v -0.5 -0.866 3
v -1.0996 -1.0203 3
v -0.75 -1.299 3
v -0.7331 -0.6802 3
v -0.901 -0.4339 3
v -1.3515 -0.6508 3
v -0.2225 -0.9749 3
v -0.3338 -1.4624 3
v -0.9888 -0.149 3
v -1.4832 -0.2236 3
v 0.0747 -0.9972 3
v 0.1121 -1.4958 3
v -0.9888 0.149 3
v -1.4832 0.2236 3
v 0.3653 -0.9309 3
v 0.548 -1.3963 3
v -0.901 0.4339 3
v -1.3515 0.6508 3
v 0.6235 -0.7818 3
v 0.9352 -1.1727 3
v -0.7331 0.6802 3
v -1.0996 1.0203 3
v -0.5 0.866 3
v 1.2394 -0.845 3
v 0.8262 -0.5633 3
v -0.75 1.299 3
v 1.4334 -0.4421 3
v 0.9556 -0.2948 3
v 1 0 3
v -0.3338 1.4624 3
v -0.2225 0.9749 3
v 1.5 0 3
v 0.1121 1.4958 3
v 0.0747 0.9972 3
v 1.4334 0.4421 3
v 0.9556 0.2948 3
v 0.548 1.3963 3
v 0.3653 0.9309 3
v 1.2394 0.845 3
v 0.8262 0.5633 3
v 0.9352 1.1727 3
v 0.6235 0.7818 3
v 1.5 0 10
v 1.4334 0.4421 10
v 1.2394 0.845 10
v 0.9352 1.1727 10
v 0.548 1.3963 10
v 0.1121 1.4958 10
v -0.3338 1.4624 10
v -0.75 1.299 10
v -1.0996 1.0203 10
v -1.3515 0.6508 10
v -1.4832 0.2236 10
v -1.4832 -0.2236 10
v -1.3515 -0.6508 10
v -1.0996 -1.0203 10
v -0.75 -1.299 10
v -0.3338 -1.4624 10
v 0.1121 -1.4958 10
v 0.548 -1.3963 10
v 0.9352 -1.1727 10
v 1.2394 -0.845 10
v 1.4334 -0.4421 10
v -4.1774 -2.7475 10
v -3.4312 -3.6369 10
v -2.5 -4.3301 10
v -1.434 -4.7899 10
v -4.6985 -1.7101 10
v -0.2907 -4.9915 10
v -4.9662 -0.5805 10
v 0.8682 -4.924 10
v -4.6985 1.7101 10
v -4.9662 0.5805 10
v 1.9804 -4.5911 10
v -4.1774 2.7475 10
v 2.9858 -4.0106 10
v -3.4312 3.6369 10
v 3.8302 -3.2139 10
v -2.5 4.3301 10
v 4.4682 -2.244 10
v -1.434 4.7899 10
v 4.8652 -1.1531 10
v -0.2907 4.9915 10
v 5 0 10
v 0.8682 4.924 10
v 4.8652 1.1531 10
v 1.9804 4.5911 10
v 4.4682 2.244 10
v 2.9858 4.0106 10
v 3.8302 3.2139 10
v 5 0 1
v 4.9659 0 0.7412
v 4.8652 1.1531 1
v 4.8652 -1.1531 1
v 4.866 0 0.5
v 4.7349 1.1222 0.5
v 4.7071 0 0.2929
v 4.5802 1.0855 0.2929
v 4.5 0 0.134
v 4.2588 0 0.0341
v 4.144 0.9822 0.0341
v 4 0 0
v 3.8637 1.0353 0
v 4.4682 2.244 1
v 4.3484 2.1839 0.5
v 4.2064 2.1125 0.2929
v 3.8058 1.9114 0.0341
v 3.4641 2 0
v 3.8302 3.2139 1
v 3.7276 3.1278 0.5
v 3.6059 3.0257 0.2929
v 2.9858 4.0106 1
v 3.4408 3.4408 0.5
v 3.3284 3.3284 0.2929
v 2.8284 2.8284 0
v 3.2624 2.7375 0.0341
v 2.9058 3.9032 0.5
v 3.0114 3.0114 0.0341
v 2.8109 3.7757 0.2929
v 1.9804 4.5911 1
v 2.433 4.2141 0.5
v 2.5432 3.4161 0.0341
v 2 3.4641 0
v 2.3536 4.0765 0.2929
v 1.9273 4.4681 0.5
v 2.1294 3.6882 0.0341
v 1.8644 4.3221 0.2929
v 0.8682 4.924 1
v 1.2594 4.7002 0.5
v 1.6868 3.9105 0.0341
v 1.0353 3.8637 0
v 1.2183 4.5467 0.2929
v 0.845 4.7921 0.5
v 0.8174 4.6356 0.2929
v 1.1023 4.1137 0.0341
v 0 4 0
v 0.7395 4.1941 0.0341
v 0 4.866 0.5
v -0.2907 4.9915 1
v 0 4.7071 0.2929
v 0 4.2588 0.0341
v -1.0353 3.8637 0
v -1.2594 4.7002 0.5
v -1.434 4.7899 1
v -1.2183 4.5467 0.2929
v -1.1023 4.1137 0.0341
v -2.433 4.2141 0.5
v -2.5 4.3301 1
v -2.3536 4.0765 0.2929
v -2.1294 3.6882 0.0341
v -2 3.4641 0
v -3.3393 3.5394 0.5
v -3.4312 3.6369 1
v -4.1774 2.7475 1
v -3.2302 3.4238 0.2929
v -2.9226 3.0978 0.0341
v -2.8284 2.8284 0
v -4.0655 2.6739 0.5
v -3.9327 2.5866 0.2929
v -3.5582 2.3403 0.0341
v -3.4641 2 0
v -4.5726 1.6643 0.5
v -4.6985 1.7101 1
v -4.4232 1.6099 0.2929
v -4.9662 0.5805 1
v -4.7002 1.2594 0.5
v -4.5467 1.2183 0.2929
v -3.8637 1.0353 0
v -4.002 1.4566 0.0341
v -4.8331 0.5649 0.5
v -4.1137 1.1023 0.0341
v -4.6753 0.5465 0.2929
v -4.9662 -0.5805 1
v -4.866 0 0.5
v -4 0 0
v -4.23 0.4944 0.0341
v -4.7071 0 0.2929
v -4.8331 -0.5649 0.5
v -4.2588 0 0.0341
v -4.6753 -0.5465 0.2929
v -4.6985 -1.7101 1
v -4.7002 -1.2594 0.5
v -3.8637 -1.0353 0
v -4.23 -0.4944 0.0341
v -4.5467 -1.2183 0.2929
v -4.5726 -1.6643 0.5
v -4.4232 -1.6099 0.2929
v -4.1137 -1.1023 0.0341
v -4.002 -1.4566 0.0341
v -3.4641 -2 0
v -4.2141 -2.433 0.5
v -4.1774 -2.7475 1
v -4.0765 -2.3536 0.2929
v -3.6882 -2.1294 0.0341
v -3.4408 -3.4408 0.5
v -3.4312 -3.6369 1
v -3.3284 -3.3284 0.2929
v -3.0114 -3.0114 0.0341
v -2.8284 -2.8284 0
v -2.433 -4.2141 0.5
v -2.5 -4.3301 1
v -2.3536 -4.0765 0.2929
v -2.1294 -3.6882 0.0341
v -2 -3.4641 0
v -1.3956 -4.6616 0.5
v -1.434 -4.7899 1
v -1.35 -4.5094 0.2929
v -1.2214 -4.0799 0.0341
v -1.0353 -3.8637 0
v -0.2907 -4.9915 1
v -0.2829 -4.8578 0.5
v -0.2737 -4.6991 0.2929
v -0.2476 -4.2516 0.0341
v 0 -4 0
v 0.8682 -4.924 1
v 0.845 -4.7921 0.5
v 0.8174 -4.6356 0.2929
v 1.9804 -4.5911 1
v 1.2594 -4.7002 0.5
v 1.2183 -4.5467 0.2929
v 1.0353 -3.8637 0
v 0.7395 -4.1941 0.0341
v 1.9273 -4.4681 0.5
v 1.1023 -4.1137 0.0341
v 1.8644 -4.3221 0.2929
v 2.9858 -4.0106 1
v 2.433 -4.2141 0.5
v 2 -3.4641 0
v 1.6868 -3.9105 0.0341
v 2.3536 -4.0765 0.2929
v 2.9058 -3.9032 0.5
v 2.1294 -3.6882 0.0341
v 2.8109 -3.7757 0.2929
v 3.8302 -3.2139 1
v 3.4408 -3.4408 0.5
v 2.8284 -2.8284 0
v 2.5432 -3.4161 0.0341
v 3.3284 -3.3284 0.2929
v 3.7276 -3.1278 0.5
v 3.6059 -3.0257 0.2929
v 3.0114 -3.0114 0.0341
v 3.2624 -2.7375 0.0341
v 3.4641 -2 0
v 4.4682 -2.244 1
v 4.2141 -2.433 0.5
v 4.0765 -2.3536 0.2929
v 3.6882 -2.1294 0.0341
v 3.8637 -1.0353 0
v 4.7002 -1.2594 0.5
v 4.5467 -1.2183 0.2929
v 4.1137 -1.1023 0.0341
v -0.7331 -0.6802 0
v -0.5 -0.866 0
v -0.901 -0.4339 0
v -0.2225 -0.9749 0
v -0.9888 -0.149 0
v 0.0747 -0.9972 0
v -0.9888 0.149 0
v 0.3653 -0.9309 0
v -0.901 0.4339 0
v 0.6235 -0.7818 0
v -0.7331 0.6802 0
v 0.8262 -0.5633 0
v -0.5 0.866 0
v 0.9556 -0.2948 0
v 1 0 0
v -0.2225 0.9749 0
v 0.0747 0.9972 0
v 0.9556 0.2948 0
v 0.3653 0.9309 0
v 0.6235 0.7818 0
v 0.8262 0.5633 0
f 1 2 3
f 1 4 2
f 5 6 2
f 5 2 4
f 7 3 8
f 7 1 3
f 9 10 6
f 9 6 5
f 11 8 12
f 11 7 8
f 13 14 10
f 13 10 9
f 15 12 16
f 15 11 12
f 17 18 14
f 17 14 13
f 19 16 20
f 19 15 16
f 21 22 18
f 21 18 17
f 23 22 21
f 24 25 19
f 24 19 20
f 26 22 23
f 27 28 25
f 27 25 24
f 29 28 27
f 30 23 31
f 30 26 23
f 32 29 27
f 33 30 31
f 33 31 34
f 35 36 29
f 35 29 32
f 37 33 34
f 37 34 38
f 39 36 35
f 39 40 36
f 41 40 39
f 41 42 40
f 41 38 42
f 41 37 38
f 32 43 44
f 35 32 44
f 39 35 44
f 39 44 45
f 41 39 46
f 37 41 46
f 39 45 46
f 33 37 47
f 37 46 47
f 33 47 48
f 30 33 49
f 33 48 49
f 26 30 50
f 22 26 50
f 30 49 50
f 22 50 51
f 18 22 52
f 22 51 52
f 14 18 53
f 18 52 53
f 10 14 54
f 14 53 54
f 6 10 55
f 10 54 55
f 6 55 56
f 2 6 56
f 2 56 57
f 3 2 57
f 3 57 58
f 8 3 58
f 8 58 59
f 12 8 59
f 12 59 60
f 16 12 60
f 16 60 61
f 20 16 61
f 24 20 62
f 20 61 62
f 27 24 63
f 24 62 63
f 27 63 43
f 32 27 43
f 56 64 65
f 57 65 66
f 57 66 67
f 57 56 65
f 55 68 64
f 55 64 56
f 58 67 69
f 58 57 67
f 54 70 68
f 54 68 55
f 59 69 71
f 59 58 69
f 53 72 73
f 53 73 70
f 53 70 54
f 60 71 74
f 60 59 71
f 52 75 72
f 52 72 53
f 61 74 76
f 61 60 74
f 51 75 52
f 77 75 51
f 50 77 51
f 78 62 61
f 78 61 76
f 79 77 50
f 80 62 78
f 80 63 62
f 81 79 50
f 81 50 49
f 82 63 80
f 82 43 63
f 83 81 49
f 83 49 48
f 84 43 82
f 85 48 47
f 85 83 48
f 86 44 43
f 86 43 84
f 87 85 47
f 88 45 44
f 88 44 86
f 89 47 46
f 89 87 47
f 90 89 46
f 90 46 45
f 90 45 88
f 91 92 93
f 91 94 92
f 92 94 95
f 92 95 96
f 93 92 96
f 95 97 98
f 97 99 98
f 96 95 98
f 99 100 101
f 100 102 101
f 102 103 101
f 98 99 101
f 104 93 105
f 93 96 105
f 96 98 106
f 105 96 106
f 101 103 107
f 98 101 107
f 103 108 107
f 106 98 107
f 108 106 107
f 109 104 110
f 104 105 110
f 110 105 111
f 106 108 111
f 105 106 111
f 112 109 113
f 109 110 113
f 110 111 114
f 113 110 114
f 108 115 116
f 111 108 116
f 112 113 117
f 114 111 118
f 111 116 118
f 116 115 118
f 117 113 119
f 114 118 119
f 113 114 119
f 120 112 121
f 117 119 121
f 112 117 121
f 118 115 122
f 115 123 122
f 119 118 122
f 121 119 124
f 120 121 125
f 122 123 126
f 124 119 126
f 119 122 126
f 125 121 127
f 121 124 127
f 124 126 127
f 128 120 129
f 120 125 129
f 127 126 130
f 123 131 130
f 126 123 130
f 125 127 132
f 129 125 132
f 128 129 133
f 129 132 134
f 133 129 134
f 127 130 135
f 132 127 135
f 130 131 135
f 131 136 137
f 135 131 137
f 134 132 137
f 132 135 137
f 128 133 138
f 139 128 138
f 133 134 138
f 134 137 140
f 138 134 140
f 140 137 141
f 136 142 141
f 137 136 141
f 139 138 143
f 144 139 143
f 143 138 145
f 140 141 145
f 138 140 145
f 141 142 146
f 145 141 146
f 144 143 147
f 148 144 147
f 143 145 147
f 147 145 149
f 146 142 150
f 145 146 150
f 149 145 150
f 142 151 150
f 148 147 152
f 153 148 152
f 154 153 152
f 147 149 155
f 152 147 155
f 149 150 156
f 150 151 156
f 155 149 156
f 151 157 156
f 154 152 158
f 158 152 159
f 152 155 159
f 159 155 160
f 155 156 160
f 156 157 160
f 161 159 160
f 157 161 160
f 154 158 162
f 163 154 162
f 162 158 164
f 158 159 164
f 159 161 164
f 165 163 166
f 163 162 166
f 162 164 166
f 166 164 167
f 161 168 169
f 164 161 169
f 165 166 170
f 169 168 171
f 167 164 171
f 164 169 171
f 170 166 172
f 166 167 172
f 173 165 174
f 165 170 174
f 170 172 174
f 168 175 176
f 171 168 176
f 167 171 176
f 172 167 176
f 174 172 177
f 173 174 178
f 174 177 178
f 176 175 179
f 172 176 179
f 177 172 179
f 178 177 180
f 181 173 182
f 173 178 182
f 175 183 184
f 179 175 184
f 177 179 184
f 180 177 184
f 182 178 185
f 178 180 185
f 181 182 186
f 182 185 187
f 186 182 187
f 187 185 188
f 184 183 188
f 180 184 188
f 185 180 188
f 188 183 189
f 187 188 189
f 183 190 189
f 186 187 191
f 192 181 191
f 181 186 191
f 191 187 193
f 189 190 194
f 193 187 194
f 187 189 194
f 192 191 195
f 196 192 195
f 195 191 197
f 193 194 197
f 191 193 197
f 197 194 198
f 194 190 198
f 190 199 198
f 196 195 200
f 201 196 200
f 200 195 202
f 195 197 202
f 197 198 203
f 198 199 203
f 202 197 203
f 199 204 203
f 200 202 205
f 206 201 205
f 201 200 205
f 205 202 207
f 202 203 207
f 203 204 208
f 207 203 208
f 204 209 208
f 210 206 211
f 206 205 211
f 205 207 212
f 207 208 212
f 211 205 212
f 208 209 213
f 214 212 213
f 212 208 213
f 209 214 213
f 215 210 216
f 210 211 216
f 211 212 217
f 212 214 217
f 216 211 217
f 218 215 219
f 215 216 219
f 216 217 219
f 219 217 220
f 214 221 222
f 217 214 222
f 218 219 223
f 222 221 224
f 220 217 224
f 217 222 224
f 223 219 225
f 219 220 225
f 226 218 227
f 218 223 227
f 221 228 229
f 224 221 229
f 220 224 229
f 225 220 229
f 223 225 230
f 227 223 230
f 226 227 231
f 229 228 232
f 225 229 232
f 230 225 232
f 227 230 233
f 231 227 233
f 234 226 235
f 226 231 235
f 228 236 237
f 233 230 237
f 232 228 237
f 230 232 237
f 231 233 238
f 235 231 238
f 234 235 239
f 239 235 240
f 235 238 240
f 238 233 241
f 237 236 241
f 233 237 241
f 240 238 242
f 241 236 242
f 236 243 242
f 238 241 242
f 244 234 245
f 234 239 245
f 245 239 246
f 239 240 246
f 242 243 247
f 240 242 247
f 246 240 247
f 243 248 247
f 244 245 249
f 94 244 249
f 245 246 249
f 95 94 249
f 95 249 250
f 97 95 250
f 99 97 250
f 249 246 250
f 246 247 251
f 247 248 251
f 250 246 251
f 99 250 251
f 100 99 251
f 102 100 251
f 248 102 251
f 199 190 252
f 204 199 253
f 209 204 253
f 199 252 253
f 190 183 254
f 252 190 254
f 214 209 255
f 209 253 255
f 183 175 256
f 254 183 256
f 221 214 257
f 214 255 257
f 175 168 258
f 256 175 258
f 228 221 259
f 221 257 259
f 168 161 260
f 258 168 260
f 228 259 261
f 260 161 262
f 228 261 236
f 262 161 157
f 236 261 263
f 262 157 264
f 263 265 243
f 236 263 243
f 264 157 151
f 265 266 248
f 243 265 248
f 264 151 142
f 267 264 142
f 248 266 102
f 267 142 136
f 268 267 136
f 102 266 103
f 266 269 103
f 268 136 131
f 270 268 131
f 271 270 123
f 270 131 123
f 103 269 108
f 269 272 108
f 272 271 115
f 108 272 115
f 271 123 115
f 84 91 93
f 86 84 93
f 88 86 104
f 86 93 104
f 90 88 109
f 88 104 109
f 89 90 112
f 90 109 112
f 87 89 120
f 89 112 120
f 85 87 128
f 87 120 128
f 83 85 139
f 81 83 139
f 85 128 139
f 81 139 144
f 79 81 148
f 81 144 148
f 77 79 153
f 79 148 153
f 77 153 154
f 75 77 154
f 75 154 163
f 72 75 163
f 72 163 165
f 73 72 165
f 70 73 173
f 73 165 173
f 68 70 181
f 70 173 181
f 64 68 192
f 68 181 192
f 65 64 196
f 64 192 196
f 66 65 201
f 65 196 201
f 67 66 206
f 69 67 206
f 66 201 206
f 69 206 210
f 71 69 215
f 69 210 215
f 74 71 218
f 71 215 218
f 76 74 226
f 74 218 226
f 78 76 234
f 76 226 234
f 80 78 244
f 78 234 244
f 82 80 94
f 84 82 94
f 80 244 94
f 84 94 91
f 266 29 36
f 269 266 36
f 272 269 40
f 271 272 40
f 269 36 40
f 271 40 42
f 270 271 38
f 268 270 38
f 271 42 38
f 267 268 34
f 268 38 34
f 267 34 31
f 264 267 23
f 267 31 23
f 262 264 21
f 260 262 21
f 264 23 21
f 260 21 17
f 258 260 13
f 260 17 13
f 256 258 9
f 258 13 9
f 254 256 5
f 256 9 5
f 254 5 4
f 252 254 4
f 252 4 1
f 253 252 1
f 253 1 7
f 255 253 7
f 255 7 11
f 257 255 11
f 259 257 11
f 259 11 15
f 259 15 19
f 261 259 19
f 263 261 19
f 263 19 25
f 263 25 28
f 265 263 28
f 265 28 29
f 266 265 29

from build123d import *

# Parameters (mm, degrees)
ESQUISSE1_R             = 5
BOSS_EXTRU_1_DEPTH      = 10
ESQUISSE2_R             = 1.5
ENL_V_MAT_EXTRU_1_DEPTH = 7
ESQUISSE3_R             = 1
ENL_V_MAT_EXTRU_2_DEPTH = 7
CONG_1_R                = 1


with BuildPart() as part:
    # Esquisse1 → Boss.-Extru.1 (new body)
    with BuildSketch(Plane.XY):
        Circle(ESQUISSE1_R)
    extrude(amount=BOSS_EXTRU_1_DEPTH)

    # Esquisse2 → Enlèv. mat.-Extru.1 (cut)
    with BuildSketch(Plane.XY.offset(10)):
        Circle(ESQUISSE2_R)
    extrude(amount=-ENL_V_MAT_EXTRU_1_DEPTH, mode=Mode.SUBTRACT)

    # Esquisse3 → Enlèv. mat.-Extru.2 (cut)
    with BuildSketch(Plane.XY.offset(3)):
        Circle(ESQUISSE3_R)
    extrude(amount=-ENL_V_MAT_EXTRU_2_DEPTH, mode=Mode.SUBTRACT)

    # Congé1
    cong_1_edges = [part.edges().sort_by_distance(p)[0] for p in [
        (-5, 0, 0),
    ]]
    fillet(cong_1_edges, radius=CONG_1_R)


solid = part.part
